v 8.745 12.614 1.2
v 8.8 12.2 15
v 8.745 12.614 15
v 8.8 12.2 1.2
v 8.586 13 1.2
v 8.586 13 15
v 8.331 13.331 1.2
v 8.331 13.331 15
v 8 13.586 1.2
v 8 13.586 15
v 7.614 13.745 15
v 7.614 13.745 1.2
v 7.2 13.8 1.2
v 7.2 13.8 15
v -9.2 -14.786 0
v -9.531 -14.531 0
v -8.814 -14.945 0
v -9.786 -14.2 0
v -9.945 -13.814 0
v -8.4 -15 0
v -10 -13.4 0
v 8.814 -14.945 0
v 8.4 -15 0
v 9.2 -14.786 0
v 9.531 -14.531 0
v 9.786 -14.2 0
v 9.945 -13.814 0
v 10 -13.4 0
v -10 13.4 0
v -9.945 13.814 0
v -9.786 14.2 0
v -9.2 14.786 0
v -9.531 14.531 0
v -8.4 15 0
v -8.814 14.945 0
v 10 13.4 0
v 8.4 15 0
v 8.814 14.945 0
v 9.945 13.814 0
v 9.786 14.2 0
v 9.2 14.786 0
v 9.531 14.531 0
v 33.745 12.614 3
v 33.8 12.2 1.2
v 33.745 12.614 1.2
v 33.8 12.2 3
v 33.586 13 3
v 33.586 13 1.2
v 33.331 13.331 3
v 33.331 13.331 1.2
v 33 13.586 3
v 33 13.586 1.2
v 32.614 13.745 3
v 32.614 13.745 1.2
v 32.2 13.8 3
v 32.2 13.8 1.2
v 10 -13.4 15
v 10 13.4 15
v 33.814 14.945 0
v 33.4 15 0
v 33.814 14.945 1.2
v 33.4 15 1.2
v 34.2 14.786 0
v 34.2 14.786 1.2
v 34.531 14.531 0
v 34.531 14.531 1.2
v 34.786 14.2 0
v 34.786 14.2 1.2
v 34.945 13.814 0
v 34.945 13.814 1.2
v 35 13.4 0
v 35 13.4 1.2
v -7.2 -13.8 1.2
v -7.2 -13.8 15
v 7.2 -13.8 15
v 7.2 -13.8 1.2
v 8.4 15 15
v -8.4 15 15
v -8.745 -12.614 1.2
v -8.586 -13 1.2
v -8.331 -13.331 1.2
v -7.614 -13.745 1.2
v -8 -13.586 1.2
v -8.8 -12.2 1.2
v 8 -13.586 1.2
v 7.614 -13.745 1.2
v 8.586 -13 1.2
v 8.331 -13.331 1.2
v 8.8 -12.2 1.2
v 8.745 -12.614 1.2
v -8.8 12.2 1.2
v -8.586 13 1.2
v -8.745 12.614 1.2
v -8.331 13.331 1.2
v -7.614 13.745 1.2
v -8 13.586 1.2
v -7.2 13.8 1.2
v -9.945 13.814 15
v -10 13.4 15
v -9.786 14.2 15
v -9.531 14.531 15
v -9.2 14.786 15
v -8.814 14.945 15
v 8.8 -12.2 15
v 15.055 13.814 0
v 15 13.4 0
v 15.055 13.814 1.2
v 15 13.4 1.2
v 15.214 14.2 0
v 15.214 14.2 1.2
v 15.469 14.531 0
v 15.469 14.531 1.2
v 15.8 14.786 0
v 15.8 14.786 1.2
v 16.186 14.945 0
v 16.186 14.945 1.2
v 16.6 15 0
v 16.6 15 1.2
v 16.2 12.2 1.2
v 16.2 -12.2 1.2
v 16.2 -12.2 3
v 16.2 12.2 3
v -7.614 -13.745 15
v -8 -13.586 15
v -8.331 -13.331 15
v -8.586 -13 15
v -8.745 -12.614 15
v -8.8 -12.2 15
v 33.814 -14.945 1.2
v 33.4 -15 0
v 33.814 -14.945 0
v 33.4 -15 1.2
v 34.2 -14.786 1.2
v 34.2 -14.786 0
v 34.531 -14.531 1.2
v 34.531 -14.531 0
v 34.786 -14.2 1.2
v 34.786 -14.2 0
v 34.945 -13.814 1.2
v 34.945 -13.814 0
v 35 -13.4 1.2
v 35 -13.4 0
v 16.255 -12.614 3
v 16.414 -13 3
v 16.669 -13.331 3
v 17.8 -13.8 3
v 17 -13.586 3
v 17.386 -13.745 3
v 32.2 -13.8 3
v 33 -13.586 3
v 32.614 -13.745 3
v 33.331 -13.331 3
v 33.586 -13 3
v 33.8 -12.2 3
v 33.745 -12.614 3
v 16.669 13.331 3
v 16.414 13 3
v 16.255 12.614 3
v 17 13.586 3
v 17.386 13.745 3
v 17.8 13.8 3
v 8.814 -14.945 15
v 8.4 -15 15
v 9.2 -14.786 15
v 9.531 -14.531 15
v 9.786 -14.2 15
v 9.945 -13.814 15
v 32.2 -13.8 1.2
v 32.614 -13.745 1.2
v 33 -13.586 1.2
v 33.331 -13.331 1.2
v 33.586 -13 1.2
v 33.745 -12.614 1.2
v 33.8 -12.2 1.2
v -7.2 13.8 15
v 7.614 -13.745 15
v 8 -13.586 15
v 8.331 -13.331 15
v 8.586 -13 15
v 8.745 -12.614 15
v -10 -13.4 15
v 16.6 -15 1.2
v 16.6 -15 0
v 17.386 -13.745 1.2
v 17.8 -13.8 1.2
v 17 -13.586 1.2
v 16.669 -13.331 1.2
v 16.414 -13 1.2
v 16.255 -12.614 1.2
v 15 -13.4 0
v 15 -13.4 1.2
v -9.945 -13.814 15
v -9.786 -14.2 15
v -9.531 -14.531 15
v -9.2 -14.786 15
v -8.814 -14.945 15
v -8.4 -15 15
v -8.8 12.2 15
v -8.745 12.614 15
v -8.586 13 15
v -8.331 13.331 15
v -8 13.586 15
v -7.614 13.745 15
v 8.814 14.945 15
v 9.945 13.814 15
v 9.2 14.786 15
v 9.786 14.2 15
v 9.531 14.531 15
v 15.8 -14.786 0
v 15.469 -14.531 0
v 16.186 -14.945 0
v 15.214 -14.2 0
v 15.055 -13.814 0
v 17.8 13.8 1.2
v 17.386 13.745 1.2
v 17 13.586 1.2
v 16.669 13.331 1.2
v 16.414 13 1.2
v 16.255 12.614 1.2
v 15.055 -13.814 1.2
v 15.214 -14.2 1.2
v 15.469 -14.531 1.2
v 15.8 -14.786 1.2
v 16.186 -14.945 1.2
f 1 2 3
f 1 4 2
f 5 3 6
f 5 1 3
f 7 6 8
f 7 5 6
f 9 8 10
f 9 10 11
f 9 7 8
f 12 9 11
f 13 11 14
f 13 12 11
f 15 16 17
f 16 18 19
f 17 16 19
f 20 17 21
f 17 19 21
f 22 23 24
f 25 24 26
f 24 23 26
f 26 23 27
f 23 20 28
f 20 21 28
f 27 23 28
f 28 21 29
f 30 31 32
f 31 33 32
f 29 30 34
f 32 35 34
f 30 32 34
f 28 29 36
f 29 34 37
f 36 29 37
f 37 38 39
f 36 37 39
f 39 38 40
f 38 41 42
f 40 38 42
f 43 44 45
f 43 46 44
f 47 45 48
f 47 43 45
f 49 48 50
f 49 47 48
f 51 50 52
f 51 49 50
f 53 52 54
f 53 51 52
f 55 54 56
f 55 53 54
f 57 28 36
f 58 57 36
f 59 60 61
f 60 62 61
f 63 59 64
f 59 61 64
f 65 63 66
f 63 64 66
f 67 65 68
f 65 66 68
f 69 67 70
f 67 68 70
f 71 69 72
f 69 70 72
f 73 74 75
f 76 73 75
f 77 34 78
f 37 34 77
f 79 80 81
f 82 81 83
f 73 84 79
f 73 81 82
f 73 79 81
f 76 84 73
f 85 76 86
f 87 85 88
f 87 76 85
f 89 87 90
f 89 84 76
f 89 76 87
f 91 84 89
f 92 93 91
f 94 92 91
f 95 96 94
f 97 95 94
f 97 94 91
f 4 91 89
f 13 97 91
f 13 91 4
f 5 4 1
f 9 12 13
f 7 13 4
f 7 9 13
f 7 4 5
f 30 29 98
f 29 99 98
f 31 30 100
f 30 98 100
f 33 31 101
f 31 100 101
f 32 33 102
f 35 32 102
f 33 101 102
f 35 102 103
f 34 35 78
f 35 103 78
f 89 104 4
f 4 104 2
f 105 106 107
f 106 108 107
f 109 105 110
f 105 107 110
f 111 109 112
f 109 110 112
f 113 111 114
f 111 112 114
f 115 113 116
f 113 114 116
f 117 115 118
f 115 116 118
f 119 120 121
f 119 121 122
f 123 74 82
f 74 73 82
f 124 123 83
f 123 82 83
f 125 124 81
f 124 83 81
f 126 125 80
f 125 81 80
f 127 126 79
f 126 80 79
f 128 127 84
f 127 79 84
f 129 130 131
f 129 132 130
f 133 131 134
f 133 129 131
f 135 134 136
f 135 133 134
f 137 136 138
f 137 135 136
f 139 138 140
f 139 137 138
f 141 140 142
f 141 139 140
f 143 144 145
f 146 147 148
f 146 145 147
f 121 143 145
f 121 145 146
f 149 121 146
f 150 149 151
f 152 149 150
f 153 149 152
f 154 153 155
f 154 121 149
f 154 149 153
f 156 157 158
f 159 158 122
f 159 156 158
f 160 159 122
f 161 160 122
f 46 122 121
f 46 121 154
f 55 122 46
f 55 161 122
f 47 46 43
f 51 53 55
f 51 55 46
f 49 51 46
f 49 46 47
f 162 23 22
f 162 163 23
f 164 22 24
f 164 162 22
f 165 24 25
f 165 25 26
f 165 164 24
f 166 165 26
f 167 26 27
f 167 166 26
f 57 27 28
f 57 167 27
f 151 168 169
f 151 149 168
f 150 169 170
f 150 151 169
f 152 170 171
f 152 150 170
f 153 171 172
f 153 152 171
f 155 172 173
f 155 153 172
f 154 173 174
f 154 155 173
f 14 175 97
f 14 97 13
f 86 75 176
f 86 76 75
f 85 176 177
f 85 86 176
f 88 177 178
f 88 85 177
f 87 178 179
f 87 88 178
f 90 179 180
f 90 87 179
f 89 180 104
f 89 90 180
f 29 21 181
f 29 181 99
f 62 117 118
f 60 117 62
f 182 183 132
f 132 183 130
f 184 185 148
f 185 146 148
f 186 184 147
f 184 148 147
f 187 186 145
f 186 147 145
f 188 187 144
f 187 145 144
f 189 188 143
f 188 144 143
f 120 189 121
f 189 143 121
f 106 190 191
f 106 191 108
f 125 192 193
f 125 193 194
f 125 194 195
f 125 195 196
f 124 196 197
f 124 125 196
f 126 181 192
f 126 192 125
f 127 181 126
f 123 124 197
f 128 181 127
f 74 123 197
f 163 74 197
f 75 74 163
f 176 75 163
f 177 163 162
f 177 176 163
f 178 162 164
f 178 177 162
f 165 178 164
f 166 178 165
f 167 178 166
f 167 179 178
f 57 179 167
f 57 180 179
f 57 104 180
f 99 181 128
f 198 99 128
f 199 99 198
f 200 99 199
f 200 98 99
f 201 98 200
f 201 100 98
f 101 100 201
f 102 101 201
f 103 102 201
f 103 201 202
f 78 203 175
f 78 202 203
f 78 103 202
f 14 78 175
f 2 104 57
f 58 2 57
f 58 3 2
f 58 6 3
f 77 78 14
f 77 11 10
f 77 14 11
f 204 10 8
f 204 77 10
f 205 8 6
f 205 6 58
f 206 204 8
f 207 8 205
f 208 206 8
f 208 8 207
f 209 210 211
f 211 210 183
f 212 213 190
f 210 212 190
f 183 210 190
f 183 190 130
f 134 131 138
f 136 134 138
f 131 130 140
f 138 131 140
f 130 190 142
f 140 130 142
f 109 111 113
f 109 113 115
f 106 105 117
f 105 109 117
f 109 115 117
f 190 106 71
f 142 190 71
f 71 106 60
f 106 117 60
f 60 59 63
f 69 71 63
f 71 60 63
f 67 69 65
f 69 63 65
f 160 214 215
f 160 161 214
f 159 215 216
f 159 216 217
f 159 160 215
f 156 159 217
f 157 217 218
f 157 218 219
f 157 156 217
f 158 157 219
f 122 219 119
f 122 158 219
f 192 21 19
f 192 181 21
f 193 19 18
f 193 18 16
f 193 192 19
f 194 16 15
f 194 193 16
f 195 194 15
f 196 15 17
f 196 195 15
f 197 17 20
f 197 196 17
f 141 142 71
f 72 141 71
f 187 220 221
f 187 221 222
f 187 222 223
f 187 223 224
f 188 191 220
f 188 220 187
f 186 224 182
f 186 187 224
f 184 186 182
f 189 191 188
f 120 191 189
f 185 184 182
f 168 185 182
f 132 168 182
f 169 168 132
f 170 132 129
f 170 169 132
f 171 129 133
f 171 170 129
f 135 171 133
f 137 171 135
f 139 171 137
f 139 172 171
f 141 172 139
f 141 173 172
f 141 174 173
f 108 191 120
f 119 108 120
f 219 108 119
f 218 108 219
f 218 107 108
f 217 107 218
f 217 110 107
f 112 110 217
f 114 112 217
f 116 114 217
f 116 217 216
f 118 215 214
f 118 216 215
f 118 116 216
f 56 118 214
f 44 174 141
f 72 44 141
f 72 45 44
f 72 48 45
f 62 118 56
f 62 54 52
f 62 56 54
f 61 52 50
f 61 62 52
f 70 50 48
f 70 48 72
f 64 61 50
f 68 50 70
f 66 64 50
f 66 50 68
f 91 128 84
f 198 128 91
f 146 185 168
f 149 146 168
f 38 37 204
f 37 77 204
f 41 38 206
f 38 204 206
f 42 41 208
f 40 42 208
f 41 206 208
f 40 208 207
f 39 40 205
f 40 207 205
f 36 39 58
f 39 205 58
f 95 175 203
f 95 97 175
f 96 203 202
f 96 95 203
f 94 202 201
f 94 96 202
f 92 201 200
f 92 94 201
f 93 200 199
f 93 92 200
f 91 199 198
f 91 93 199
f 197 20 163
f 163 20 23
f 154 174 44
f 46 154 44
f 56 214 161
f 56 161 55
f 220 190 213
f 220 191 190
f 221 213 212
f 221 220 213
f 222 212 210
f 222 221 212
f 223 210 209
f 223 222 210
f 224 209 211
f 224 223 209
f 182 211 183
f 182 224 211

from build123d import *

# Parameters (mm, degrees)
F4_W      = 20
F4_H      = 30
F5_DEPTH  = 15
F6_W      = 17.6
F6_H      = 27.6
F7_DEPTH  = 13.8
F8_R      = 1.6
F9_W      = 20
F9_H      = 30
F10_DEPTH = 1.2
F11_W     = 17.6
F11_H     = 27.6
F12_DEPTH = 1.8
F13_R     = 1.6


with BuildPart() as f5:
    # F4 (on Top) → F5 (new body)
    with BuildSketch(Plane.XY):
        Rectangle(F4_W, F4_H)
    extrude(amount=F5_DEPTH)

    # F6 (on face) → F7 (cut)
    with BuildSketch(Plane.XY.offset(15)):
        Rectangle(F6_W, F6_H)
    extrude(amount=-F7_DEPTH, mode=Mode.SUBTRACT)

    # F8
    f8_edges = [f5.edges().sort_by_distance(p)[0] for p in [
        (10, 15, 7.5),
        (10, -15, 7.5),
        (-10, -15, 7.5),
        (-10, 15, 7.5),
        (-8.8, 13.8, 8.1),
        (8.8, 13.8, 8.1),
        (8.8, -13.8, 8.1),
        (-8.8, -13.8, 8.1),
    ]]
    fillet(f8_edges, radius=F8_R)


with BuildPart() as f10:
    # F9 (on Top) → F10 (new body)
    with BuildSketch(Plane.XY):
        with Locations((25, 0)):
            Rectangle(F9_W, F9_H)
    extrude(amount=F10_DEPTH)

    # F11 (on face) → F12 (join)
    with BuildSketch(Plane.XY.offset(1.2)):
        with Locations((25, 0)):
            Rectangle(F11_W, F11_H)
    extrude(amount=F12_DEPTH)

    # F13
    f13_edges = [f10.edges().sort_by_distance(p)[0] for p in [
        (35, 15, 0.6),
        (33.8, 13.8, 2.1),
        (33.8, -13.8, 2.1),
        (35, -15, 0.6),
        (16.2, -13.8, 2.1),
        (15, -15, 0.6),
        (15, 15, 0.6),
        (16.2, 13.8, 2.1),
    ]]
    fillet(f13_edges, radius=F13_R)


solid = Compound([f5.part, f10.part])
